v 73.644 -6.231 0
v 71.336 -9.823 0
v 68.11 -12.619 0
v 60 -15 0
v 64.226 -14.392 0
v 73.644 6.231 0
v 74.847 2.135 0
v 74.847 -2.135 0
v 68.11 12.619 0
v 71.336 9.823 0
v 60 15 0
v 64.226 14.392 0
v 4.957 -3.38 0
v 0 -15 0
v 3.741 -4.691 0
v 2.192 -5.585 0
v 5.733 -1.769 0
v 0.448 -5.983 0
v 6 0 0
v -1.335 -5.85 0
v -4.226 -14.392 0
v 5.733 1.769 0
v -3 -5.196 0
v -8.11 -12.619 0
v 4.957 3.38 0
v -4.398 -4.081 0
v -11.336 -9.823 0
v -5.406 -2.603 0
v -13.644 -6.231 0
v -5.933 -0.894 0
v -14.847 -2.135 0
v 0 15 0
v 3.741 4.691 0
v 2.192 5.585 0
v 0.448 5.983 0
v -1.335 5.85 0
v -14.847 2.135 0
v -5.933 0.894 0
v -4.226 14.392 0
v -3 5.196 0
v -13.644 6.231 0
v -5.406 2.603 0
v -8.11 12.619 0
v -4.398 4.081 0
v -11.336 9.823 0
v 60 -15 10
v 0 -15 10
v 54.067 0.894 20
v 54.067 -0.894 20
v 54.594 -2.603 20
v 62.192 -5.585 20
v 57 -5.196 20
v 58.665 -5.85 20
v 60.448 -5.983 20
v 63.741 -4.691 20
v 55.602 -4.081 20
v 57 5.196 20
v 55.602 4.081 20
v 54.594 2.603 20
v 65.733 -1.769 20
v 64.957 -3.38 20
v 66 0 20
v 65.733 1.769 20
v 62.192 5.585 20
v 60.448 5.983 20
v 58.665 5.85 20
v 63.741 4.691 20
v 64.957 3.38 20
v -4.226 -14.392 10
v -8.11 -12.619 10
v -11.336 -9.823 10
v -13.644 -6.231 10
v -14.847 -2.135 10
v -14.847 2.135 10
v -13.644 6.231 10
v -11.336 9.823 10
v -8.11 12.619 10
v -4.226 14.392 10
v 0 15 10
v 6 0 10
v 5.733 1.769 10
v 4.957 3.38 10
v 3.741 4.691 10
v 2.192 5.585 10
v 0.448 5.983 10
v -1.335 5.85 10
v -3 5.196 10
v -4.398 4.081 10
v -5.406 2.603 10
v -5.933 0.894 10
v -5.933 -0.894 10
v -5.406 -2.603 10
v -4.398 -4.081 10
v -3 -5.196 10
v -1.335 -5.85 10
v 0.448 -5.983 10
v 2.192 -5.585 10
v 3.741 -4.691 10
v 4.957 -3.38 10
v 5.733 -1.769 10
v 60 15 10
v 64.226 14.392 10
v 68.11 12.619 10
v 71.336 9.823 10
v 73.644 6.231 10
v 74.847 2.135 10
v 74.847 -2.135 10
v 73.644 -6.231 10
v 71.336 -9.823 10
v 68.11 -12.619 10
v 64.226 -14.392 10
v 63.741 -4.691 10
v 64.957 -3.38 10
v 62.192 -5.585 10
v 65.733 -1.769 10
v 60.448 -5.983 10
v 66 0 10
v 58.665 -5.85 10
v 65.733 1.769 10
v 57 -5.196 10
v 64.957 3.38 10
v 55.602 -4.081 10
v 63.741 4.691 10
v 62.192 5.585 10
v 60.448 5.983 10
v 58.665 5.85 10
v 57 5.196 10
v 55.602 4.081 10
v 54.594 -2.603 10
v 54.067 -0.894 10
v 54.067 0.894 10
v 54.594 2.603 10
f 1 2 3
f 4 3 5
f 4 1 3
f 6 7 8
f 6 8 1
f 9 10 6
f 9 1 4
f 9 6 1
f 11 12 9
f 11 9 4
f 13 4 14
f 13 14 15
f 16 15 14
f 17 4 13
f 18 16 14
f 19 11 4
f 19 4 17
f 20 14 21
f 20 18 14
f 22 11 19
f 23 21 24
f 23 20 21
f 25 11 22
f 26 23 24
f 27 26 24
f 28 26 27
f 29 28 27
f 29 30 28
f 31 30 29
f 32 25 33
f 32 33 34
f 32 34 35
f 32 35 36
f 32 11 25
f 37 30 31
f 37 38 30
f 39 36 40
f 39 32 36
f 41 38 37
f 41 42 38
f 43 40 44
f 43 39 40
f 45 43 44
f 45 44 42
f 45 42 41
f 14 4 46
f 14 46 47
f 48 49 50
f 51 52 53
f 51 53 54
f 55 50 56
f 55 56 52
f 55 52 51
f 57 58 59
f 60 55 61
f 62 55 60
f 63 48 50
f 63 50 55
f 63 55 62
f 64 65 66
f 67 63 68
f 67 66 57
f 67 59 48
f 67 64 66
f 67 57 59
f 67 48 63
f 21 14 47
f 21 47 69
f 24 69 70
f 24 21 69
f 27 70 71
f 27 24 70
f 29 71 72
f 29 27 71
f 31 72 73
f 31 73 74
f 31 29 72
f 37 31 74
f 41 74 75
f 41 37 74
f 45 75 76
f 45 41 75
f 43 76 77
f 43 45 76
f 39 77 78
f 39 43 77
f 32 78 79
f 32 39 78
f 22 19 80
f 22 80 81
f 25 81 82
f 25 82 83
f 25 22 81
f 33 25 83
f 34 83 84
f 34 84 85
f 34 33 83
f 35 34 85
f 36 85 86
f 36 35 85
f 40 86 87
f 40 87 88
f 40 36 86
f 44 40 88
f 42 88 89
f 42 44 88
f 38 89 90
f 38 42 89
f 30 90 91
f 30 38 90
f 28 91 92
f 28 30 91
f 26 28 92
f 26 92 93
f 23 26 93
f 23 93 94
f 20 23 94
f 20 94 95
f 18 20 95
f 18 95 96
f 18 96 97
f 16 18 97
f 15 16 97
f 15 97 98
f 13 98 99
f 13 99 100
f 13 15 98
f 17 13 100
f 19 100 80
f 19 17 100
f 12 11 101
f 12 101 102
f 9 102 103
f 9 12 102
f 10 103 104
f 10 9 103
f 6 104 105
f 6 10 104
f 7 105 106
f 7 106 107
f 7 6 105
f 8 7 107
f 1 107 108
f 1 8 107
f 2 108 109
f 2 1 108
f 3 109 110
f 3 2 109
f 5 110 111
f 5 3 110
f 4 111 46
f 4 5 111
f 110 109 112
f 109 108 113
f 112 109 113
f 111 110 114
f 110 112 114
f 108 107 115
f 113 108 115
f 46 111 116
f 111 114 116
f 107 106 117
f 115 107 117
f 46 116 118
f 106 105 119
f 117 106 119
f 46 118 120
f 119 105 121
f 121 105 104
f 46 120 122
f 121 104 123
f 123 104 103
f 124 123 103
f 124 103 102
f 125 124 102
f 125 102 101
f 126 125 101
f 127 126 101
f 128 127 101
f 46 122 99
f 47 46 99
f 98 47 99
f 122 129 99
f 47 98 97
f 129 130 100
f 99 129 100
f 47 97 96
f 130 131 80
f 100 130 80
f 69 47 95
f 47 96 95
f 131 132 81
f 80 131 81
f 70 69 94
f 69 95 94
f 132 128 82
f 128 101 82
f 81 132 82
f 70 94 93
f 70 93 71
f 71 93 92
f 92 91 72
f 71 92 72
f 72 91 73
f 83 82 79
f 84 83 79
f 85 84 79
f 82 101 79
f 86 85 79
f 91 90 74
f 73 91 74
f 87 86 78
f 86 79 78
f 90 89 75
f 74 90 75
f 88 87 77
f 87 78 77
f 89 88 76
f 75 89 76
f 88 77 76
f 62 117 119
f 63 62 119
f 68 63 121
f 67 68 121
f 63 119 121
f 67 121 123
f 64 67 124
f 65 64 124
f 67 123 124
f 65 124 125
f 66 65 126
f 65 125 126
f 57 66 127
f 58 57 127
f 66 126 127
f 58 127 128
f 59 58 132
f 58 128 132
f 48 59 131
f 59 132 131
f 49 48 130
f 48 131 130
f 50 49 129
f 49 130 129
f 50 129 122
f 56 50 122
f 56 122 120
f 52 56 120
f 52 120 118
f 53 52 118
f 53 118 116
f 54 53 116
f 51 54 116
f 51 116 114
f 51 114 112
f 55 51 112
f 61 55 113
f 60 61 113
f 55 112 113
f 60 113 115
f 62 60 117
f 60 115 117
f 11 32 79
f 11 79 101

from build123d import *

# Parameters (mm, degrees)
CROQUIS1_R              = 6
SALIENTE_EXTRUIR1_DEPTH = 10
CROQUIS2_R              = 6
SALIENTE_EXTRUIR2_DEPTH = 10


with BuildPart() as part:
    # Croquis1 → Saliente-Extruir1 (new body)
    with BuildSketch(Plane.XY):
        with BuildLine():
            Line((0, 15), (60, 15))
            ThreePointArc((60, 15), (75, 0), (60, -15))
            Line((60, -15), (0, -15))
            ThreePointArc((0, -15), (-15, 0), (0, 15))
        make_face()
        Circle(CROQUIS1_R, mode=Mode.SUBTRACT)
    extrude(amount=SALIENTE_EXTRUIR1_DEPTH)

    # Croquis2 → Saliente-Extruir2 (add)
    with BuildSketch(Plane.XY.offset(10)):
        with Locations((60, 0)):
            Circle(CROQUIS2_R)
    extrude(amount=SALIENTE_EXTRUIR2_DEPTH)


solid = part.part
